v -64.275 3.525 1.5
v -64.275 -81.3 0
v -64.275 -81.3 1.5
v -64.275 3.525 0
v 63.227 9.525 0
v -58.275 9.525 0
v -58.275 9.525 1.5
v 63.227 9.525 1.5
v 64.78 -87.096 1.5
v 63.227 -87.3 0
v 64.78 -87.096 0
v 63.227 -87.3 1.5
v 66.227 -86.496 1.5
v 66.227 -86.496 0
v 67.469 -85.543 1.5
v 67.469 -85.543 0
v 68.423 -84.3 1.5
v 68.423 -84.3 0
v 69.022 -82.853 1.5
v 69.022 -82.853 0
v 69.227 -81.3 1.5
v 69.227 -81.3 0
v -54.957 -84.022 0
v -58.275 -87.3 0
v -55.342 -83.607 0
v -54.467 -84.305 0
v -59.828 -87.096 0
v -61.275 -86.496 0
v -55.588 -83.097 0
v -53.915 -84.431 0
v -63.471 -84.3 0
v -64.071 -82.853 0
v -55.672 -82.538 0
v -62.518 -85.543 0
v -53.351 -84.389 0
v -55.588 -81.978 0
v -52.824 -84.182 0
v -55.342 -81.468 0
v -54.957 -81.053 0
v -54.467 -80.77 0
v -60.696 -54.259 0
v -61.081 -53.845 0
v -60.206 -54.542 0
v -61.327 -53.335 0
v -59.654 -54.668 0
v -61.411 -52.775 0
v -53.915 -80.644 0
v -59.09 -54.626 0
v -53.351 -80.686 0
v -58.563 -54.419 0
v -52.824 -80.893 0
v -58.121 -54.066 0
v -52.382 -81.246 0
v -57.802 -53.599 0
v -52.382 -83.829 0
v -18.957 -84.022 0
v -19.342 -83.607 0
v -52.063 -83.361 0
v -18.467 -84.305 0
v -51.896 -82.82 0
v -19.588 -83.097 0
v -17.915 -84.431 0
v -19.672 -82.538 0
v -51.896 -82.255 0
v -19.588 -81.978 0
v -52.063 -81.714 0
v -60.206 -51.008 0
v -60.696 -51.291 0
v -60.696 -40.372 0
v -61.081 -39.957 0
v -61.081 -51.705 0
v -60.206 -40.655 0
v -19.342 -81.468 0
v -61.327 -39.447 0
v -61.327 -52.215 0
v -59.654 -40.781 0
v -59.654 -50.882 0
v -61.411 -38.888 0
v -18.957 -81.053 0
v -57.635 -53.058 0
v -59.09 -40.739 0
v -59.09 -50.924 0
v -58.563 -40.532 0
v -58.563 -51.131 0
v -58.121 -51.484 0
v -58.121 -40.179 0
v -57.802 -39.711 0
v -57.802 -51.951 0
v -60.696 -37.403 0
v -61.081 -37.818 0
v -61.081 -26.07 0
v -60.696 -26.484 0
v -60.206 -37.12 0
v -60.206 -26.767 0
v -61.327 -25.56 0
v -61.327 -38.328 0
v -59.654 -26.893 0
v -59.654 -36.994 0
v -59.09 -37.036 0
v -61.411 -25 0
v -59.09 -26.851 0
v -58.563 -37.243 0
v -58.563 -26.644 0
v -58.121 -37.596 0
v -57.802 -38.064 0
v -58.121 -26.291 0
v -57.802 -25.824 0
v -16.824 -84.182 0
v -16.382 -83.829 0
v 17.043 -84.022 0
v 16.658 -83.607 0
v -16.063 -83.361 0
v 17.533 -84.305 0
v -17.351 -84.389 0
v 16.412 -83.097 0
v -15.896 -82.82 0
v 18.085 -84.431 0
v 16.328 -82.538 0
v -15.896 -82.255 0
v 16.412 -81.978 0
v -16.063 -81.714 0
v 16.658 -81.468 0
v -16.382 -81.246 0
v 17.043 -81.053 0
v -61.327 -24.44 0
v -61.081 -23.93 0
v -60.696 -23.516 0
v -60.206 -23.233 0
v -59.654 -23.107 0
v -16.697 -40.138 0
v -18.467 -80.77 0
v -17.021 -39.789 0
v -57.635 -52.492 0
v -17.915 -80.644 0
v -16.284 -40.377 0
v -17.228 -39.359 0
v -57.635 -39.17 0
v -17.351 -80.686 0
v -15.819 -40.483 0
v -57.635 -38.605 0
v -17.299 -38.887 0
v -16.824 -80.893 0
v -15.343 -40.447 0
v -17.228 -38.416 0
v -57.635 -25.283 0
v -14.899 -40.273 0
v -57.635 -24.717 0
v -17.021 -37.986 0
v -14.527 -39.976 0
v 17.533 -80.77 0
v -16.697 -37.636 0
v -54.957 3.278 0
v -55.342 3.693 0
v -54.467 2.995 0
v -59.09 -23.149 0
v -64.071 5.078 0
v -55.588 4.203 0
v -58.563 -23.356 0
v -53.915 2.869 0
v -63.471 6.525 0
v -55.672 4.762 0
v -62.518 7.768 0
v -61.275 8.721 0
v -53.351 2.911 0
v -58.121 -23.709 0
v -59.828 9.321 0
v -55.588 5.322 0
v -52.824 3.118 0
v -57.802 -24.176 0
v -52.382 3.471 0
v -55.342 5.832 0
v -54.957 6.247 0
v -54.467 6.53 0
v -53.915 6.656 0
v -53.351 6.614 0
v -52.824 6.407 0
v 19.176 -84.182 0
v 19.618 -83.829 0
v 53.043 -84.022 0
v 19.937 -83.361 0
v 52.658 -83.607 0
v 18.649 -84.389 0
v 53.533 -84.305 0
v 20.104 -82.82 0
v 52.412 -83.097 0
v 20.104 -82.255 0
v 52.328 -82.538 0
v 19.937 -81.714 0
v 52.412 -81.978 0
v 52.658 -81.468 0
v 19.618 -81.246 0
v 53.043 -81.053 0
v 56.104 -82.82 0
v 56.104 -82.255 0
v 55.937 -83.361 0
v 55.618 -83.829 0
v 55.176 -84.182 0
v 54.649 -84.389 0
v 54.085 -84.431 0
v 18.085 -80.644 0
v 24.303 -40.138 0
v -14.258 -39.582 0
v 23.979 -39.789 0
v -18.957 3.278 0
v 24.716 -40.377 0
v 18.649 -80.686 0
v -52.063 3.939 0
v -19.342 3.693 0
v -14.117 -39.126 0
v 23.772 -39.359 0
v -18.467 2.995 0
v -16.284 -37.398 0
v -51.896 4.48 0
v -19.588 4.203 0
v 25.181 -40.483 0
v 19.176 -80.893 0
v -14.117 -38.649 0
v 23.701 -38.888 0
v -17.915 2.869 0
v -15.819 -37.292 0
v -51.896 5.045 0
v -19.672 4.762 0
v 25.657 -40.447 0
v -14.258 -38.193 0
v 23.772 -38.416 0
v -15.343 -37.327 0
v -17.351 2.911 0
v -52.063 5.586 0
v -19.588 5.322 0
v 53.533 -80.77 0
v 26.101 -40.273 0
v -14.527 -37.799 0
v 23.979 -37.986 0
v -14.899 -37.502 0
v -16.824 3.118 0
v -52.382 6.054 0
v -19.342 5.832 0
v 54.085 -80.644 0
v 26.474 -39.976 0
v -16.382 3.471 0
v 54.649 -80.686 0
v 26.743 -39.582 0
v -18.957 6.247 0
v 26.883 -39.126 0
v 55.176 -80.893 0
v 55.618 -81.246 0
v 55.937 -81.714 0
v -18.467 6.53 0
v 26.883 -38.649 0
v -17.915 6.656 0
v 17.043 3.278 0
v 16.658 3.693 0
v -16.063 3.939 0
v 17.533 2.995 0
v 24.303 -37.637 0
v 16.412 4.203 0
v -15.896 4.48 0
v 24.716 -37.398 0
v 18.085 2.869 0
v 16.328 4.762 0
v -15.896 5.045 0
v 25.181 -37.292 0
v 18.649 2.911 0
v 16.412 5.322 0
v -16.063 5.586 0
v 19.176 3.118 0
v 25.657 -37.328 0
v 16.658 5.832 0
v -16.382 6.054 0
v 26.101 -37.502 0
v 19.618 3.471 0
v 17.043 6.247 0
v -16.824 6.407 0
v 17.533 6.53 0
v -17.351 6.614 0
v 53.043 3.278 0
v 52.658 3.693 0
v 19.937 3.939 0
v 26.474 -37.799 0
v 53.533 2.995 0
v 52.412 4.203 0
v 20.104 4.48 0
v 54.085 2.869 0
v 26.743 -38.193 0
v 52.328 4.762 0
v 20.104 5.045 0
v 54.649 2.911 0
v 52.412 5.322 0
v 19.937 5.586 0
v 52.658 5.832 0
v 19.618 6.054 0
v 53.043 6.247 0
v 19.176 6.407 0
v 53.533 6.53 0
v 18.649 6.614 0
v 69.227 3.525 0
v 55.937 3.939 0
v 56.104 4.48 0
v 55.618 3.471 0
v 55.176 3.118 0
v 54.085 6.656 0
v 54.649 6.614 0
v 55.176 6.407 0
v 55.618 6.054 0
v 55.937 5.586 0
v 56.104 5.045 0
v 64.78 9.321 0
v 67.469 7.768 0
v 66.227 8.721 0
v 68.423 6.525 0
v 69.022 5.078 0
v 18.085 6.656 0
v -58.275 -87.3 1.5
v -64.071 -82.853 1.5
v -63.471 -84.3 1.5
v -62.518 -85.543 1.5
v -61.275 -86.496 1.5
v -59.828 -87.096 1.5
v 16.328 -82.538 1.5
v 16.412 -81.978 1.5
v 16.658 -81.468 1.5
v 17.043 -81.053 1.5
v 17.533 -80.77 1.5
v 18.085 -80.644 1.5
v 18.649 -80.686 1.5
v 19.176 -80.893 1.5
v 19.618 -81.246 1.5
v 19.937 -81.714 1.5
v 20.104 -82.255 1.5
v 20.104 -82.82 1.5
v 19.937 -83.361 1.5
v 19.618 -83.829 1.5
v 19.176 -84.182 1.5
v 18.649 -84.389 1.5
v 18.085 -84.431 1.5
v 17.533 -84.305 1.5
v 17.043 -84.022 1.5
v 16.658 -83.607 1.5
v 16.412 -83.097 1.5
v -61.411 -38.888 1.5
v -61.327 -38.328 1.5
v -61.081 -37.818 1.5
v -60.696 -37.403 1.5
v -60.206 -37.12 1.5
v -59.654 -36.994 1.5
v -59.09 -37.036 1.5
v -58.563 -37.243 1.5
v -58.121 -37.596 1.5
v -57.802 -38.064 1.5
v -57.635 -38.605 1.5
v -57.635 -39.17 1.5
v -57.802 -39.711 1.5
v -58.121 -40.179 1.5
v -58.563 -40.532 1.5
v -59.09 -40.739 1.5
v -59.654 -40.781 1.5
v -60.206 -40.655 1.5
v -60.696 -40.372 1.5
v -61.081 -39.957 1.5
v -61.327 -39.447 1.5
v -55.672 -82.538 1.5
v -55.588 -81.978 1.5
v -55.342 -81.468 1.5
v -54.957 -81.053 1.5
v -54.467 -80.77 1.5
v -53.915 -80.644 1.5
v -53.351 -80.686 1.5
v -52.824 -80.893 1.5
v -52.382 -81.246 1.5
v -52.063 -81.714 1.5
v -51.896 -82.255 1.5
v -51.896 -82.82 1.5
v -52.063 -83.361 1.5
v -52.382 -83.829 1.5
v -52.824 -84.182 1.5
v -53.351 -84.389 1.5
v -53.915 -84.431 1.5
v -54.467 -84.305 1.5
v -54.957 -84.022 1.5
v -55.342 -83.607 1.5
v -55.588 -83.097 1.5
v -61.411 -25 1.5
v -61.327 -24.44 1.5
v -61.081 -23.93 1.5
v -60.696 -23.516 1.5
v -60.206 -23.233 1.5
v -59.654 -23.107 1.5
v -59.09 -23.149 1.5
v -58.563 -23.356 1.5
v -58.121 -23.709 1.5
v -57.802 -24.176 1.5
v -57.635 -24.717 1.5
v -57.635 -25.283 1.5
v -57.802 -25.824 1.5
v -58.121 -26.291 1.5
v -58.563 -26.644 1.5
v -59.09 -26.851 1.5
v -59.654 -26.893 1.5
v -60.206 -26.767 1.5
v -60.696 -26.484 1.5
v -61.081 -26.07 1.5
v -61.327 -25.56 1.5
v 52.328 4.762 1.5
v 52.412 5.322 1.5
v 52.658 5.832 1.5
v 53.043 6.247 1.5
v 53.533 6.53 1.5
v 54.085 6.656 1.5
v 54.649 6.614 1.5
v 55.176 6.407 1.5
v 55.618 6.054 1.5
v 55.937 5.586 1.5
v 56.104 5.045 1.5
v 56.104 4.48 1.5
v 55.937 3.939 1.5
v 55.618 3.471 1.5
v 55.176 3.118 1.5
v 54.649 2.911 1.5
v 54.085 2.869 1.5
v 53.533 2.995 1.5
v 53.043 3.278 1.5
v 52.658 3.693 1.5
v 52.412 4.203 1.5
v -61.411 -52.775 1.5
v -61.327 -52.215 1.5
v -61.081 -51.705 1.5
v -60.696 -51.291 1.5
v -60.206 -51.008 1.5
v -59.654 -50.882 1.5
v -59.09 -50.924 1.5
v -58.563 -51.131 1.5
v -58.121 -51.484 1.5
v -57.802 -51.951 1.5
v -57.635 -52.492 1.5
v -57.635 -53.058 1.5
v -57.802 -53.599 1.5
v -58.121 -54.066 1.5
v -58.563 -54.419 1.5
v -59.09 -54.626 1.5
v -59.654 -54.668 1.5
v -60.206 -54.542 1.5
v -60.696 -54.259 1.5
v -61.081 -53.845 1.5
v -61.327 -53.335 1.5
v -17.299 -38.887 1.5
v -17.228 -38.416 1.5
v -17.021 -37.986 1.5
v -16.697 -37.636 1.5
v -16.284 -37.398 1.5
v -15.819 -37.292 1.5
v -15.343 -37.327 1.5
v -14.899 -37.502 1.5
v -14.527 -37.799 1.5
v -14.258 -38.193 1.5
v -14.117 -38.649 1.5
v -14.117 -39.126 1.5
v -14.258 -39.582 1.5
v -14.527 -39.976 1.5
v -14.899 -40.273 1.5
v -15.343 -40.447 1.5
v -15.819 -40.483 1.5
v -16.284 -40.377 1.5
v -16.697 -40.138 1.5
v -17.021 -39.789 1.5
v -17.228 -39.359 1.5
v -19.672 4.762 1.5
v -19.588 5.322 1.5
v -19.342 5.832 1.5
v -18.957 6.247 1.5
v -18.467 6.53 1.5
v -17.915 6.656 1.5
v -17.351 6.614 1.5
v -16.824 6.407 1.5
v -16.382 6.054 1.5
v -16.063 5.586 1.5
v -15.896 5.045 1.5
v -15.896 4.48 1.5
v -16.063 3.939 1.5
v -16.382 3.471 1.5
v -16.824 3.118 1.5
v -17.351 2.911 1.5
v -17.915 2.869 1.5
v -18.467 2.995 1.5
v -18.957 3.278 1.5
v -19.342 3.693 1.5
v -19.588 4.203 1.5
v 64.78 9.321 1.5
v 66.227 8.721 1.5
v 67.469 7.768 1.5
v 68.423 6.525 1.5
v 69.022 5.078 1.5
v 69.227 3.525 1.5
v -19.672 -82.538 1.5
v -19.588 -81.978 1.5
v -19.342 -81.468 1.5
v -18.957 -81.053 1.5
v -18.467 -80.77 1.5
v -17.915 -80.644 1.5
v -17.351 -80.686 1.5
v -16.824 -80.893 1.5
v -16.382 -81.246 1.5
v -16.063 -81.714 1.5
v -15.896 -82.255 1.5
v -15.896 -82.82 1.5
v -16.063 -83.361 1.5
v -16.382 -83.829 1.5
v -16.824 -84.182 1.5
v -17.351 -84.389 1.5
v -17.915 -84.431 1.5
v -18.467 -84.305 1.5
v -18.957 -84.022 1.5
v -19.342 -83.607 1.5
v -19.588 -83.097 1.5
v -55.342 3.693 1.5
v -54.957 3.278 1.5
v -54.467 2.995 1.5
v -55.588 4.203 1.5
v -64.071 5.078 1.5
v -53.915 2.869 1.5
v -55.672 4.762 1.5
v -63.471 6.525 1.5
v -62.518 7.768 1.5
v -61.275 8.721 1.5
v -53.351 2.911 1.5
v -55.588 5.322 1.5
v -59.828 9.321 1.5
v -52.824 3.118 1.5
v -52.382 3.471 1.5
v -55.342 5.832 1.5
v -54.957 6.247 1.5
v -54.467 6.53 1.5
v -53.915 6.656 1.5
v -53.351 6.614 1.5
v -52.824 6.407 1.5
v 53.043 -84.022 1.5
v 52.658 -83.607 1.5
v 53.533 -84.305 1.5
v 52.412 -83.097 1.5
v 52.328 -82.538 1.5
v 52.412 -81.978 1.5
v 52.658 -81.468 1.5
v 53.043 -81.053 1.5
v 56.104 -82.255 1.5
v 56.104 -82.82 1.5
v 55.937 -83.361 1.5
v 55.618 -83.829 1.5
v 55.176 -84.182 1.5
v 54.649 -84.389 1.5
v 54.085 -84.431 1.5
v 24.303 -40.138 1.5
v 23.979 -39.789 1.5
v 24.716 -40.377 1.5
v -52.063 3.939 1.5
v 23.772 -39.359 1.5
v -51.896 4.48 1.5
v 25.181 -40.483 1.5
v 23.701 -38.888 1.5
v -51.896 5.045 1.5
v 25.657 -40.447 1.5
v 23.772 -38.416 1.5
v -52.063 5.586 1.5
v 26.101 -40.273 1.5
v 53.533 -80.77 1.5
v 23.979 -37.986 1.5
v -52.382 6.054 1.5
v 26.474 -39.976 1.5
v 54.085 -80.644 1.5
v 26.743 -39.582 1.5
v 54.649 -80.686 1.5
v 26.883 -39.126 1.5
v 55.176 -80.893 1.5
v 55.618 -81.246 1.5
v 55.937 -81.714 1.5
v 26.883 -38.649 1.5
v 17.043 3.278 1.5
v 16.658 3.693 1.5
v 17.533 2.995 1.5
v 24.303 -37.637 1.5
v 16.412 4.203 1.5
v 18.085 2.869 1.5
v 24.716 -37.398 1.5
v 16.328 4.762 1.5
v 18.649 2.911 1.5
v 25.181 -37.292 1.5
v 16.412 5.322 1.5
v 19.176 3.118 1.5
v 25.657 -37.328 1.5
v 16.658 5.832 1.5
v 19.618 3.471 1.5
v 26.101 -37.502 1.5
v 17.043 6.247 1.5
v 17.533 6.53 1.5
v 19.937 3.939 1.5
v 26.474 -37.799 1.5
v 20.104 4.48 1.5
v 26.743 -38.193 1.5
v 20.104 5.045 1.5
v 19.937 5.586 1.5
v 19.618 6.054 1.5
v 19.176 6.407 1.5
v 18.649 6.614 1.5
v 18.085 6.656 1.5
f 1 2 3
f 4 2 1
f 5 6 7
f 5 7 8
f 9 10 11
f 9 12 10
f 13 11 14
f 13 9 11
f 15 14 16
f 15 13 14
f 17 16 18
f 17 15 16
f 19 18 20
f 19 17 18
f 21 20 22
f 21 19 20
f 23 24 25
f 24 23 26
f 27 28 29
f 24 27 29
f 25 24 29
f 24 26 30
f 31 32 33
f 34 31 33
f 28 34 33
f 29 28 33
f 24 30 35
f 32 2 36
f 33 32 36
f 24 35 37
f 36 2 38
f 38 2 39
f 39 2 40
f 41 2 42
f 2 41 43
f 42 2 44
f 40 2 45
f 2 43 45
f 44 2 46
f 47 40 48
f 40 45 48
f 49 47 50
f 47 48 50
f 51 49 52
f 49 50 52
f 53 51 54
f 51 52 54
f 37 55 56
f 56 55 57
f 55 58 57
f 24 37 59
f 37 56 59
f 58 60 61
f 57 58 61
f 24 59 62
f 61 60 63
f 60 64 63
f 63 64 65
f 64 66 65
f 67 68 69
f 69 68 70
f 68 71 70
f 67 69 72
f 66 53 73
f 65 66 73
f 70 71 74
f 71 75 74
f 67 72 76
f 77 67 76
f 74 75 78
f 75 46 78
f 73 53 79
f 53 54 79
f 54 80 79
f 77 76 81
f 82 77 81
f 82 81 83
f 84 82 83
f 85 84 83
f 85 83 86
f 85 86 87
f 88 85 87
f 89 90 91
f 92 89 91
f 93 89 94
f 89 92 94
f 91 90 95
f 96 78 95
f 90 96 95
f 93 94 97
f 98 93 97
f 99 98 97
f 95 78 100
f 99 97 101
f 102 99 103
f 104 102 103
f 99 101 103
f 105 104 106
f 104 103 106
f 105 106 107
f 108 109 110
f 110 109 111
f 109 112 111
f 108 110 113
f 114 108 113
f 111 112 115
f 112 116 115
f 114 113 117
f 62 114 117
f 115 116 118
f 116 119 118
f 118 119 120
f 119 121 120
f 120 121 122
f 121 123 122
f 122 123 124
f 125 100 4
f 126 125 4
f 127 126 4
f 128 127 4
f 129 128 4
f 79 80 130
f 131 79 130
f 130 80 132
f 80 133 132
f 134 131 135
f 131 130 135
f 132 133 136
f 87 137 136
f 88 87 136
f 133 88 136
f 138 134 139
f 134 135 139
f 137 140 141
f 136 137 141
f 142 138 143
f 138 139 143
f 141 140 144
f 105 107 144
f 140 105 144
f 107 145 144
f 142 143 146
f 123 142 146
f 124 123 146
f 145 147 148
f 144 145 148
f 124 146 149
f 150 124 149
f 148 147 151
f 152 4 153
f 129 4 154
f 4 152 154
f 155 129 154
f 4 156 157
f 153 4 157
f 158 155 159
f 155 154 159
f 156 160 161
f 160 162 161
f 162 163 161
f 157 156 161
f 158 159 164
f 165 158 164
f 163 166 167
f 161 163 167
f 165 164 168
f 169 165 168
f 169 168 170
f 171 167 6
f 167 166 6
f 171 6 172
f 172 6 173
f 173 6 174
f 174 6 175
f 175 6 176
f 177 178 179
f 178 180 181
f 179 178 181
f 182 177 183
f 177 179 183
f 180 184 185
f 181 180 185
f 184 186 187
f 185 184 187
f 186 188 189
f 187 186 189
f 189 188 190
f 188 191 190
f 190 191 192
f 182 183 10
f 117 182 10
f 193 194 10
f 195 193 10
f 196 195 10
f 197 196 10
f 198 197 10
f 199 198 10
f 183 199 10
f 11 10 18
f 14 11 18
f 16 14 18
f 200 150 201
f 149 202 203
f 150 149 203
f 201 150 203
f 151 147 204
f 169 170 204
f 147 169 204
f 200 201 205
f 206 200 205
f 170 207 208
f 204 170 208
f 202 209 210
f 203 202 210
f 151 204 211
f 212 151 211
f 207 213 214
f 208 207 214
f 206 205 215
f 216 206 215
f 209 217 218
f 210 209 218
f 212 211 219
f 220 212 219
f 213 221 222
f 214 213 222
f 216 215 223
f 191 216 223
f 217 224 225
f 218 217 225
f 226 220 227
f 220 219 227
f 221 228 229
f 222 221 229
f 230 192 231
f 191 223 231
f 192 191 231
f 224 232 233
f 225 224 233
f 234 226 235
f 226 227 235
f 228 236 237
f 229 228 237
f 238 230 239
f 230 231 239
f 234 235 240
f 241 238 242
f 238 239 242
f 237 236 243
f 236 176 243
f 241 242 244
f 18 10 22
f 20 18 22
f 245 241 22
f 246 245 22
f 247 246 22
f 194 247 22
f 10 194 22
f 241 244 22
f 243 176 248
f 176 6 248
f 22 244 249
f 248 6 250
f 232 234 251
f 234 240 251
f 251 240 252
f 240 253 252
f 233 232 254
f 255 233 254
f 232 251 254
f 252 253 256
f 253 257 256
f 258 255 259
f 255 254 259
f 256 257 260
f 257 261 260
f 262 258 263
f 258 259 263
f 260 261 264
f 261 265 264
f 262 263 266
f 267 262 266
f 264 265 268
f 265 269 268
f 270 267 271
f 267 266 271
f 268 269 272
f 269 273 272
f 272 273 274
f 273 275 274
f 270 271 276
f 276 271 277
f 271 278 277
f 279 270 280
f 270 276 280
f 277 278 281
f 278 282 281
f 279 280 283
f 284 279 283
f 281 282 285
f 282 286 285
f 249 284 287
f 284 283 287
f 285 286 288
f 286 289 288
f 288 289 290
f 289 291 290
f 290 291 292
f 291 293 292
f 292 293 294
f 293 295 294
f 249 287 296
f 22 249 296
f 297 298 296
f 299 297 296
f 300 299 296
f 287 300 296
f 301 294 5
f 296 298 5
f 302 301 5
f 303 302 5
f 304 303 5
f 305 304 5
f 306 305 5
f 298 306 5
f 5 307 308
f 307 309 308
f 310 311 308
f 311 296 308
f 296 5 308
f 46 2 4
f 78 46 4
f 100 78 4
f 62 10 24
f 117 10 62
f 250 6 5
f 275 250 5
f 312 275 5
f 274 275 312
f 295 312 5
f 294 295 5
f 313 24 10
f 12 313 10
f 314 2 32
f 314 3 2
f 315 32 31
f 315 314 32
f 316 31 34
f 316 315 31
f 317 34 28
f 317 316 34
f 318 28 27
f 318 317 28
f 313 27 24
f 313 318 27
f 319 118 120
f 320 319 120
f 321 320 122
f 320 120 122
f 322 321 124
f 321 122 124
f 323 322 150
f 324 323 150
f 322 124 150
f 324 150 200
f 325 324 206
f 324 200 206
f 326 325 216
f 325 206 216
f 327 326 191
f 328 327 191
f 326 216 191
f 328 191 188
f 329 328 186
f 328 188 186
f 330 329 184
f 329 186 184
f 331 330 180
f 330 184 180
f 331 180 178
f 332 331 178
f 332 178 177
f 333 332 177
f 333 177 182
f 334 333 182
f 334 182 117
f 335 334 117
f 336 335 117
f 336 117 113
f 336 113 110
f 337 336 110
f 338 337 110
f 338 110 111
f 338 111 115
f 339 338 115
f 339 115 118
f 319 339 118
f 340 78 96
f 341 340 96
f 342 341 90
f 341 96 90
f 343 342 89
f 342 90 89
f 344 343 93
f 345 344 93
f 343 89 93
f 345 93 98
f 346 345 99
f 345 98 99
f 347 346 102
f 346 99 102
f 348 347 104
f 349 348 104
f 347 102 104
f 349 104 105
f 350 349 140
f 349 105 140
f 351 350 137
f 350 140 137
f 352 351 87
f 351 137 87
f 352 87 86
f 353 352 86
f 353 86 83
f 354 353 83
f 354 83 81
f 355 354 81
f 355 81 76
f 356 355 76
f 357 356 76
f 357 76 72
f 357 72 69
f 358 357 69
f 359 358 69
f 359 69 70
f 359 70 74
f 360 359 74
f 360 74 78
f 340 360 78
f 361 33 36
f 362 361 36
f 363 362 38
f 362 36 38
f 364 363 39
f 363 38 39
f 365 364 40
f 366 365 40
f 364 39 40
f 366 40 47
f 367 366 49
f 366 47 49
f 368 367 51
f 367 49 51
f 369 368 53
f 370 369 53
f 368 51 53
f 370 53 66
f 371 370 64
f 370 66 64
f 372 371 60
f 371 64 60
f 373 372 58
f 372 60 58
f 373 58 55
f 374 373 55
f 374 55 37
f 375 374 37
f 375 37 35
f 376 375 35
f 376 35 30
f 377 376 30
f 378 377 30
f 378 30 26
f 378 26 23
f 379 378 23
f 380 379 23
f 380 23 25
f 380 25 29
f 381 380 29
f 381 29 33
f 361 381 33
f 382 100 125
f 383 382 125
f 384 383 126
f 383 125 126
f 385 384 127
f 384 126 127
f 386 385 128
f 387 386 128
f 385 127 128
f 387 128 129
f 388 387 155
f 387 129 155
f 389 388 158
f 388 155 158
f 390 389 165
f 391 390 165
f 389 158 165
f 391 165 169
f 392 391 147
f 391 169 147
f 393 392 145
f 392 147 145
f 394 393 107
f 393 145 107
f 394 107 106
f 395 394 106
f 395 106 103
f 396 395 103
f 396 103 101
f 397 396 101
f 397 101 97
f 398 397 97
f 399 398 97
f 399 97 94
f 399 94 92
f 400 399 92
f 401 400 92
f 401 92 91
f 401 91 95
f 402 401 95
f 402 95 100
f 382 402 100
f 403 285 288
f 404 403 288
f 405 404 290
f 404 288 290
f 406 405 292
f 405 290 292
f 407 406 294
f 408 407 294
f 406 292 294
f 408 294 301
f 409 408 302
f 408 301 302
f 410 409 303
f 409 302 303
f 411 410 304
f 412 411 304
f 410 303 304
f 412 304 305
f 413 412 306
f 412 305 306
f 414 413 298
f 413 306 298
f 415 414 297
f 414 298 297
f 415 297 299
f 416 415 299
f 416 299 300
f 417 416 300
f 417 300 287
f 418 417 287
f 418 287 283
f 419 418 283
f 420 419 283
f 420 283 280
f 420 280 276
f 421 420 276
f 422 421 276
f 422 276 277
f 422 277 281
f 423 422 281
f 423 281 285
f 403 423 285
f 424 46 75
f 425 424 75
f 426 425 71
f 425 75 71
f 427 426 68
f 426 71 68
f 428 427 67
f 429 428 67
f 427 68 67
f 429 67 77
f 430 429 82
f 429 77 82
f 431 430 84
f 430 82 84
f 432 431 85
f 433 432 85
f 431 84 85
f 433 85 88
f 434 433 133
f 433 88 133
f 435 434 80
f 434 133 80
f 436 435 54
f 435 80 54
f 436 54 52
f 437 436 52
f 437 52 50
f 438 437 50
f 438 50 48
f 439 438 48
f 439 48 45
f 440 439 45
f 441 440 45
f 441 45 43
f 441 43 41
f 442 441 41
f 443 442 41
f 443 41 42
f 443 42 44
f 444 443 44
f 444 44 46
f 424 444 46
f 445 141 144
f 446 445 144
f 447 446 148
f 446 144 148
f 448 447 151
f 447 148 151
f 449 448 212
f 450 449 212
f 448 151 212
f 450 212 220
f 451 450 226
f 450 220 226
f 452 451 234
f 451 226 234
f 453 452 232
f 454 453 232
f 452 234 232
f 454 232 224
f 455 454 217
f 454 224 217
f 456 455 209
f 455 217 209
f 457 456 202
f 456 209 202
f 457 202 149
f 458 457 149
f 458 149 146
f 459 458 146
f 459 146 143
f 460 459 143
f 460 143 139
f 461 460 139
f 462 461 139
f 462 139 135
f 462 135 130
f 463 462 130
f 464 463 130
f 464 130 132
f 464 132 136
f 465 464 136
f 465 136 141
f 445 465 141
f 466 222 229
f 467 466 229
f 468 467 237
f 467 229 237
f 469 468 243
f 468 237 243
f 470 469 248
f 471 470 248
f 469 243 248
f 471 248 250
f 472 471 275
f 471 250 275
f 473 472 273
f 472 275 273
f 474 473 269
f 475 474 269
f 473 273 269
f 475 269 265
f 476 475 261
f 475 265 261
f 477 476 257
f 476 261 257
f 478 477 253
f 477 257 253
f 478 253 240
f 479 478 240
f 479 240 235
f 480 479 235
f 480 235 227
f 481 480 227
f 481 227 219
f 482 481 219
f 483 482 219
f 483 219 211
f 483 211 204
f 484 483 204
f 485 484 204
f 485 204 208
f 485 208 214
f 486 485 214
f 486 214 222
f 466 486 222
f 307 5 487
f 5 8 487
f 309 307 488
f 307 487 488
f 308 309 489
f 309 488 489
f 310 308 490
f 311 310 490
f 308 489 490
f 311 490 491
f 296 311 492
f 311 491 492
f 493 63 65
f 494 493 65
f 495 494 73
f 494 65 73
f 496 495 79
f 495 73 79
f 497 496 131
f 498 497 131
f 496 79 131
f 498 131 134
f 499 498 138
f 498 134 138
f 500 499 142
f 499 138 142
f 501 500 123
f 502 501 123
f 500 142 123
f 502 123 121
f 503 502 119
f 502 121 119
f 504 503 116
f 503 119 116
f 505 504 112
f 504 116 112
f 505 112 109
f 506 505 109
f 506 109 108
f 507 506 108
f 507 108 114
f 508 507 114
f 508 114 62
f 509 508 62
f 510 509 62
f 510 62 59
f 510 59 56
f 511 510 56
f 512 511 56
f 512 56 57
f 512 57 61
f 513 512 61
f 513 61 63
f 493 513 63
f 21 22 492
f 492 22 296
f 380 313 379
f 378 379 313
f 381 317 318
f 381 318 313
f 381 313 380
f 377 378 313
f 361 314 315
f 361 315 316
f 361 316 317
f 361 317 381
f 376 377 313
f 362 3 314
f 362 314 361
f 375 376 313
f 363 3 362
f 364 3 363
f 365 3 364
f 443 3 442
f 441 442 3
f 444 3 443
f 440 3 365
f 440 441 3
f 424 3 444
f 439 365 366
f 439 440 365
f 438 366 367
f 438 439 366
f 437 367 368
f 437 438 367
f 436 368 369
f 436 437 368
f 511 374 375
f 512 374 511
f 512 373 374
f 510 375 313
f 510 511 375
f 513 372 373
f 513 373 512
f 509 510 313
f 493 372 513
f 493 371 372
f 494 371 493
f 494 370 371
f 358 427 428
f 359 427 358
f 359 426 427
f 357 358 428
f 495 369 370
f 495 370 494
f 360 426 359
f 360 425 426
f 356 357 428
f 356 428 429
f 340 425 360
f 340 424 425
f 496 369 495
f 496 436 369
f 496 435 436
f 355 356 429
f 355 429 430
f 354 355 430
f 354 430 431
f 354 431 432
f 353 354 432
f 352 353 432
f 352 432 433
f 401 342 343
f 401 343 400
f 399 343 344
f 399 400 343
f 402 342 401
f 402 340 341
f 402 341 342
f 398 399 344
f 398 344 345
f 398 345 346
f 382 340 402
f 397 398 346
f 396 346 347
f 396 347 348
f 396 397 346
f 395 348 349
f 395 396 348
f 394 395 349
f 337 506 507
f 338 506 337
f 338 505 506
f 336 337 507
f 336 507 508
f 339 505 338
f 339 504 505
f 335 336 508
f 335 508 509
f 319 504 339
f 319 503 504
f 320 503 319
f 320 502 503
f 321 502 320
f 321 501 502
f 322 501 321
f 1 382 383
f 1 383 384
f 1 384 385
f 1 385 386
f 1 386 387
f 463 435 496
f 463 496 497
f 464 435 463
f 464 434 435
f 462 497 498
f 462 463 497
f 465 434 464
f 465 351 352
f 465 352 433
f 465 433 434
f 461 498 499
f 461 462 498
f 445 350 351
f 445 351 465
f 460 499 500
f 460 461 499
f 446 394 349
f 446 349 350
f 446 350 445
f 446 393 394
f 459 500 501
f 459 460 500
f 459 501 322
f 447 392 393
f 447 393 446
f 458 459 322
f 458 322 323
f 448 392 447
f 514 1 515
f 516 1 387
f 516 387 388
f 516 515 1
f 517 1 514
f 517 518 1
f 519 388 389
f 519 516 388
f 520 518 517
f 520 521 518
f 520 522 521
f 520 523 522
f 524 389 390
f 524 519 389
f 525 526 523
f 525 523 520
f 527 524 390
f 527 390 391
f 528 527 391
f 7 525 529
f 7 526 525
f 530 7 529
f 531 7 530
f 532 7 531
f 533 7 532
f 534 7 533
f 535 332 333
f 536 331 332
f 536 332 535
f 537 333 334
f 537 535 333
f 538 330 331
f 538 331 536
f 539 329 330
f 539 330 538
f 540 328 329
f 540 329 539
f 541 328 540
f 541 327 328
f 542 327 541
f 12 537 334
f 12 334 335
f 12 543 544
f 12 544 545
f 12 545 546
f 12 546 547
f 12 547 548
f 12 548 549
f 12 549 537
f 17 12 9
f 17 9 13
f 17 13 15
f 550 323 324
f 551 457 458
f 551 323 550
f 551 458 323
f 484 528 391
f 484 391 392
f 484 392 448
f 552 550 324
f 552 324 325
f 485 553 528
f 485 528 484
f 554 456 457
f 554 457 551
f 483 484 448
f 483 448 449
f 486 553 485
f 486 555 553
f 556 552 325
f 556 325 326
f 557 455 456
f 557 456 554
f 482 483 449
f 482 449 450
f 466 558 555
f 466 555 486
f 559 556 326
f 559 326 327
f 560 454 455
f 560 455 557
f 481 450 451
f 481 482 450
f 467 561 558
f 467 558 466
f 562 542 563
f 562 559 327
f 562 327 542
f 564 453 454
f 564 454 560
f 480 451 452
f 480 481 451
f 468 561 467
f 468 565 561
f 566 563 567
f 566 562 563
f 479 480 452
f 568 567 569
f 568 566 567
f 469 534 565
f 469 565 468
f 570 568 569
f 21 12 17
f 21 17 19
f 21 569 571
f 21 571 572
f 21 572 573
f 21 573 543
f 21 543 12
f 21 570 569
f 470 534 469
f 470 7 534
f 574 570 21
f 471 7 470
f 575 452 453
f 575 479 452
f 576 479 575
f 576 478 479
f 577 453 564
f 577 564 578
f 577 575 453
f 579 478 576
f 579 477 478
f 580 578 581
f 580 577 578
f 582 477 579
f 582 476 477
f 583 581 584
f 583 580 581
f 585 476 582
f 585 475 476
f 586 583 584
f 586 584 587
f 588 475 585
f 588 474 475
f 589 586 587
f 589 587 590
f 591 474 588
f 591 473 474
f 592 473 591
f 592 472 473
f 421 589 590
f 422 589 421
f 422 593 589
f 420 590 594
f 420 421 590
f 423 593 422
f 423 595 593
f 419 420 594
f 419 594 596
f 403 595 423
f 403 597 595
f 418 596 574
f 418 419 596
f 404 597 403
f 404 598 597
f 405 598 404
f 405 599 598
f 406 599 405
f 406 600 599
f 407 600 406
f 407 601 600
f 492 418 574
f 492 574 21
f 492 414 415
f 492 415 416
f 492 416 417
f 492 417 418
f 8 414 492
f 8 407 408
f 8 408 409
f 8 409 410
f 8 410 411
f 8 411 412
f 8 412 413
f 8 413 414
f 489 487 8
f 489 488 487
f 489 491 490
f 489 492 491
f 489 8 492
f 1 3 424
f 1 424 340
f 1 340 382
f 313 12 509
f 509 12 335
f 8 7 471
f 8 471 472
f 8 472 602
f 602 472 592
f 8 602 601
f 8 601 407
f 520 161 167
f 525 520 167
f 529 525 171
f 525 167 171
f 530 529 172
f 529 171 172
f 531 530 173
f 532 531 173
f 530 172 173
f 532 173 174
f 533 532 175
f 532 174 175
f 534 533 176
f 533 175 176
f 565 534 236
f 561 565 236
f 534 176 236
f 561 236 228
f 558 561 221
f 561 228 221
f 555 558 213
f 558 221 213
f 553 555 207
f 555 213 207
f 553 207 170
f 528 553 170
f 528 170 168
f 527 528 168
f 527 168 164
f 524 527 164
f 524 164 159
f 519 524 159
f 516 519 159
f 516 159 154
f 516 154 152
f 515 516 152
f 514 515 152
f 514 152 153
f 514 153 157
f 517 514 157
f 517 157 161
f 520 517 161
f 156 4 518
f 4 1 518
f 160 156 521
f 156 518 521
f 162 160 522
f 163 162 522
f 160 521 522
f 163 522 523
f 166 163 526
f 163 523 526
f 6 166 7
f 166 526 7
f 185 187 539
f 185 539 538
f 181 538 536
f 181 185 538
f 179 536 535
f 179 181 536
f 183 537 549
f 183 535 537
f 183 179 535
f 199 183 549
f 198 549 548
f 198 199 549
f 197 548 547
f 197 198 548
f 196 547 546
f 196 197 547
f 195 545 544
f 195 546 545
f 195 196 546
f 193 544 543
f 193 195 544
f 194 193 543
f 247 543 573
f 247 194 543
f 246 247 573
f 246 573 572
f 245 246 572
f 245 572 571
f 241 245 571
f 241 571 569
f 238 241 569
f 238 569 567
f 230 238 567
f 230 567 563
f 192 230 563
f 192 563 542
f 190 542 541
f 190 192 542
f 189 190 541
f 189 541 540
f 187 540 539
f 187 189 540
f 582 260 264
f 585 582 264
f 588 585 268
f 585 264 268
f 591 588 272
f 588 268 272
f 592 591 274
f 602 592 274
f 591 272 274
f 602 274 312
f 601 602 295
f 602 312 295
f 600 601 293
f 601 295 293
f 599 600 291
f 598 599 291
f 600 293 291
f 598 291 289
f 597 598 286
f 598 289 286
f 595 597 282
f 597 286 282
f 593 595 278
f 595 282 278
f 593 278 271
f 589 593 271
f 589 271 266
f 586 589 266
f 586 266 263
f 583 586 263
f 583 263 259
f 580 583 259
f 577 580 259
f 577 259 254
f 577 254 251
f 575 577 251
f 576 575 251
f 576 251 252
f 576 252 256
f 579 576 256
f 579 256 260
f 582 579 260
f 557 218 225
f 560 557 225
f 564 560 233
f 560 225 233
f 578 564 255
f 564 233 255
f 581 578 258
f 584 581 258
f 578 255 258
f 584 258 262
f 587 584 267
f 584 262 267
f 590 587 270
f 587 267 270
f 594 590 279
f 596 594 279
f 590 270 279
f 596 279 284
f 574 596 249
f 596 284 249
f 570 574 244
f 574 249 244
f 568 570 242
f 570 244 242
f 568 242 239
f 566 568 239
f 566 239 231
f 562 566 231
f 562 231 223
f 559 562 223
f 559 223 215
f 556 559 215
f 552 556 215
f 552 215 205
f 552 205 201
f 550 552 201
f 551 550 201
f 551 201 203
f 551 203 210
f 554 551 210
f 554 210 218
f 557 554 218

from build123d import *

# Parameters (mm, degrees)
SKETCH1_W             = 133.501685986
SKETCH1_H             = 96.825
BOSS_EXTRUDE1_DEPTH   = 1.5
F_6_CLEARANCE_HOLE1_D = 3.7973
LPATTERN1_COUNT       = 4
LPATTERN1_PITCH       = 36
MIRROR1_COPY_1_D      = 3.7973
MIRROR1_COPY_2_D      = 3.7973
MIRROR1_COPY_3_D      = 3.7973
F_6_CLEARANCE_HOLE2_D = 3.7973
LPATTERN2_COUNT       = 3
LPATTERN2_PITCH       = 13.8875
FILLET1_R             = 6
SKETCH11_R            = 1.6
CUT_EXTRUDE1_DEPTH    = 112.42654106


with BuildPart() as part:
    # Sketch1 → Boss-Extrude1 (new body)
    with BuildSketch(Plane.XY):
        with Locations((2.475842993, -38.8875)):
            Rectangle(SKETCH1_W, SKETCH1_H)
    extrude(amount=BOSS_EXTRUDE1_DEPTH)

    # #6 Clearance Hole1 (through all)
    with Locations(Plane.XY.offset(1.5)):
        with Locations((54.226685986, 4.7625)):
            f_6_clearance_hole1 = Hole(F_6_CLEARANCE_HOLE1_D / 2)

    # LPattern1: #6 Clearance Hole1 ×4
    with Locations(*[(-i * LPATTERN1_PITCH, 0, 0) for i in range(1, LPATTERN1_COUNT)]):
        add(f_6_clearance_hole1, mode=Mode.SUBTRACT)

    # Mirror1: #6 Clearance Hole1 across plane
    add(f_6_clearance_hole1.mirror(Plane.ZX.offset(-38.8875)), mode=Mode.SUBTRACT)

    # Mirror1 copy 1 (through all)
    with Locations(Plane(origin=(-36, -77.775, 1.5), x_dir=(1, 0, 0), z_dir=(0, 0, 1))):
        with Locations((54.226685986, -4.7625)):
            Hole(MIRROR1_COPY_1_D / 2)

    # Mirror1 copy 2 (through all)
    with Locations(Plane(origin=(-72, -77.775, 1.5), x_dir=(1, 0, 0), z_dir=(0, 0, 1))):
        with Locations((54.226685986, -4.7625)):
            Hole(MIRROR1_COPY_2_D / 2)

    # Mirror1 copy 3 (through all)
    with Locations(Plane(origin=(-108, -77.775, 1.5), x_dir=(1, 0, 0), z_dir=(0, 0, 1))):
        with Locations((54.226685986, -4.7625)):
            Hole(MIRROR1_COPY_3_D / 2)

    # #6 Clearance Hole2 (through all)
    with Locations(Plane.XY.offset(1.5)):
        with Locations((-59.5125, -52.775)):
            f_6_clearance_hole2 = Hole(F_6_CLEARANCE_HOLE2_D / 2)

    # LPattern2: #6 Clearance Hole2 ×3
    with Locations(*[(0, i * LPATTERN2_PITCH, 0) for i in range(1, LPATTERN2_COUNT)]):
        add(f_6_clearance_hole2, mode=Mode.SUBTRACT)

    # Fillet1
    fillet1_edges = [part.edges().sort_by_distance(p)[0] for p in [
        (-64.275, -87.3, 0.75),
        (-64.275, 9.525, 0.75),
        (69.226685986, 9.525, 0.75),
        (69.226685986, -87.3, 0.75),
    ]]
    fillet(fillet1_edges, radius=FILLET1_R)

    # Sketch11 → Cut-Extrude1 (cut, through all)
    with BuildSketch(Plane(origin=(0, 0, 0), x_dir=(-1, 0, 0), z_dir=(0, 0, -1))):
        with Locations((-25.301031068, -38.88751017)):
            Circle(SKETCH11_R)
        with Locations((15.699384735, -38.887383169)):
            Circle(SKETCH11_R)
    extrude(amount=-CUT_EXTRUDE1_DEPTH, mode=Mode.SUBTRACT)


solid = part.part
